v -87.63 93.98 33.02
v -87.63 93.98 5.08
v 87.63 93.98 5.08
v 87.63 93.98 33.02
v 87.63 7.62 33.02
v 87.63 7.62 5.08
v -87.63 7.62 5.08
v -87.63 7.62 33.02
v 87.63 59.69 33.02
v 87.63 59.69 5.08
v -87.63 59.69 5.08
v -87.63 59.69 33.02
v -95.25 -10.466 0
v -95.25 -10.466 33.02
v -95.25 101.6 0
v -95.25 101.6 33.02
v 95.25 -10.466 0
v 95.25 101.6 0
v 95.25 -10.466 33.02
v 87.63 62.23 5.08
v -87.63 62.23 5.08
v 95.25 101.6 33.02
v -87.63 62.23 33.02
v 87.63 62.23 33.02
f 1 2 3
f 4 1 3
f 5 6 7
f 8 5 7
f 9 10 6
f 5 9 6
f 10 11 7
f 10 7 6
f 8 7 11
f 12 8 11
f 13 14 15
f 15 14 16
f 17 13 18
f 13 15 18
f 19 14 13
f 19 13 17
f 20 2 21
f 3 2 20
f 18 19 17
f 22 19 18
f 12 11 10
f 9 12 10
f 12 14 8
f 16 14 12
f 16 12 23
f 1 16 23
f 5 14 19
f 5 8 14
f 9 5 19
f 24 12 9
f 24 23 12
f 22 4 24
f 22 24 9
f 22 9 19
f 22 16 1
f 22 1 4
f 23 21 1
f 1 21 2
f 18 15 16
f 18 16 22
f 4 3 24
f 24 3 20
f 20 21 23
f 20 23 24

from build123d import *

# Parameters (mm, degrees)
F0_W     = 190.5
F0_H     = 101.6
F0_W_2   = 175.26
F0_H_2   = 2.54
F1_DEPTH = 33.02
F0_H_3   = 31.75
F0_H_4   = 52.07
F2_DEPTH = 5.08
F3_W     = 190.5
F3_H     = 10.465697
F4_DEPTH = 33.02


with BuildPart() as f1:
    # F0 (on Top) → F1 (new body)
    with BuildSketch(Plane.XY):
        with Locations((0, 50.8)):
            Rectangle(F0_W, F0_H)
        Polygon((87.63, 7.62), (-87.63, 7.62), (-87.63, 59.69), (-87.63, 62.23), (-87.63, 93.98), (87.63, 93.98), (87.63, 62.23), (87.63, 59.69), align=None, mode=Mode.SUBTRACT)
        with Locations((0, 60.96)):
            Rectangle(F0_W_2, F0_H_2)
    extrude(amount=F1_DEPTH)

    # F0 (on Top) → F2 (join)
    with BuildSketch(Plane.XY):
        with Locations((0, 78.105)):
            Rectangle(F0_W_2, F0_H_3)
        with Locations((0, 33.655)):
            Rectangle(F0_W_2, F0_H_4)
    extrude(amount=F2_DEPTH)

    # F3 (on face) → F4 (join)
    with BuildSketch(Plane.XY.offset(33.02)):
        with Locations((0, -5.232848)):
            Rectangle(F3_W, F3_H)
    extrude(amount=-F4_DEPTH)


solid = f1.part
